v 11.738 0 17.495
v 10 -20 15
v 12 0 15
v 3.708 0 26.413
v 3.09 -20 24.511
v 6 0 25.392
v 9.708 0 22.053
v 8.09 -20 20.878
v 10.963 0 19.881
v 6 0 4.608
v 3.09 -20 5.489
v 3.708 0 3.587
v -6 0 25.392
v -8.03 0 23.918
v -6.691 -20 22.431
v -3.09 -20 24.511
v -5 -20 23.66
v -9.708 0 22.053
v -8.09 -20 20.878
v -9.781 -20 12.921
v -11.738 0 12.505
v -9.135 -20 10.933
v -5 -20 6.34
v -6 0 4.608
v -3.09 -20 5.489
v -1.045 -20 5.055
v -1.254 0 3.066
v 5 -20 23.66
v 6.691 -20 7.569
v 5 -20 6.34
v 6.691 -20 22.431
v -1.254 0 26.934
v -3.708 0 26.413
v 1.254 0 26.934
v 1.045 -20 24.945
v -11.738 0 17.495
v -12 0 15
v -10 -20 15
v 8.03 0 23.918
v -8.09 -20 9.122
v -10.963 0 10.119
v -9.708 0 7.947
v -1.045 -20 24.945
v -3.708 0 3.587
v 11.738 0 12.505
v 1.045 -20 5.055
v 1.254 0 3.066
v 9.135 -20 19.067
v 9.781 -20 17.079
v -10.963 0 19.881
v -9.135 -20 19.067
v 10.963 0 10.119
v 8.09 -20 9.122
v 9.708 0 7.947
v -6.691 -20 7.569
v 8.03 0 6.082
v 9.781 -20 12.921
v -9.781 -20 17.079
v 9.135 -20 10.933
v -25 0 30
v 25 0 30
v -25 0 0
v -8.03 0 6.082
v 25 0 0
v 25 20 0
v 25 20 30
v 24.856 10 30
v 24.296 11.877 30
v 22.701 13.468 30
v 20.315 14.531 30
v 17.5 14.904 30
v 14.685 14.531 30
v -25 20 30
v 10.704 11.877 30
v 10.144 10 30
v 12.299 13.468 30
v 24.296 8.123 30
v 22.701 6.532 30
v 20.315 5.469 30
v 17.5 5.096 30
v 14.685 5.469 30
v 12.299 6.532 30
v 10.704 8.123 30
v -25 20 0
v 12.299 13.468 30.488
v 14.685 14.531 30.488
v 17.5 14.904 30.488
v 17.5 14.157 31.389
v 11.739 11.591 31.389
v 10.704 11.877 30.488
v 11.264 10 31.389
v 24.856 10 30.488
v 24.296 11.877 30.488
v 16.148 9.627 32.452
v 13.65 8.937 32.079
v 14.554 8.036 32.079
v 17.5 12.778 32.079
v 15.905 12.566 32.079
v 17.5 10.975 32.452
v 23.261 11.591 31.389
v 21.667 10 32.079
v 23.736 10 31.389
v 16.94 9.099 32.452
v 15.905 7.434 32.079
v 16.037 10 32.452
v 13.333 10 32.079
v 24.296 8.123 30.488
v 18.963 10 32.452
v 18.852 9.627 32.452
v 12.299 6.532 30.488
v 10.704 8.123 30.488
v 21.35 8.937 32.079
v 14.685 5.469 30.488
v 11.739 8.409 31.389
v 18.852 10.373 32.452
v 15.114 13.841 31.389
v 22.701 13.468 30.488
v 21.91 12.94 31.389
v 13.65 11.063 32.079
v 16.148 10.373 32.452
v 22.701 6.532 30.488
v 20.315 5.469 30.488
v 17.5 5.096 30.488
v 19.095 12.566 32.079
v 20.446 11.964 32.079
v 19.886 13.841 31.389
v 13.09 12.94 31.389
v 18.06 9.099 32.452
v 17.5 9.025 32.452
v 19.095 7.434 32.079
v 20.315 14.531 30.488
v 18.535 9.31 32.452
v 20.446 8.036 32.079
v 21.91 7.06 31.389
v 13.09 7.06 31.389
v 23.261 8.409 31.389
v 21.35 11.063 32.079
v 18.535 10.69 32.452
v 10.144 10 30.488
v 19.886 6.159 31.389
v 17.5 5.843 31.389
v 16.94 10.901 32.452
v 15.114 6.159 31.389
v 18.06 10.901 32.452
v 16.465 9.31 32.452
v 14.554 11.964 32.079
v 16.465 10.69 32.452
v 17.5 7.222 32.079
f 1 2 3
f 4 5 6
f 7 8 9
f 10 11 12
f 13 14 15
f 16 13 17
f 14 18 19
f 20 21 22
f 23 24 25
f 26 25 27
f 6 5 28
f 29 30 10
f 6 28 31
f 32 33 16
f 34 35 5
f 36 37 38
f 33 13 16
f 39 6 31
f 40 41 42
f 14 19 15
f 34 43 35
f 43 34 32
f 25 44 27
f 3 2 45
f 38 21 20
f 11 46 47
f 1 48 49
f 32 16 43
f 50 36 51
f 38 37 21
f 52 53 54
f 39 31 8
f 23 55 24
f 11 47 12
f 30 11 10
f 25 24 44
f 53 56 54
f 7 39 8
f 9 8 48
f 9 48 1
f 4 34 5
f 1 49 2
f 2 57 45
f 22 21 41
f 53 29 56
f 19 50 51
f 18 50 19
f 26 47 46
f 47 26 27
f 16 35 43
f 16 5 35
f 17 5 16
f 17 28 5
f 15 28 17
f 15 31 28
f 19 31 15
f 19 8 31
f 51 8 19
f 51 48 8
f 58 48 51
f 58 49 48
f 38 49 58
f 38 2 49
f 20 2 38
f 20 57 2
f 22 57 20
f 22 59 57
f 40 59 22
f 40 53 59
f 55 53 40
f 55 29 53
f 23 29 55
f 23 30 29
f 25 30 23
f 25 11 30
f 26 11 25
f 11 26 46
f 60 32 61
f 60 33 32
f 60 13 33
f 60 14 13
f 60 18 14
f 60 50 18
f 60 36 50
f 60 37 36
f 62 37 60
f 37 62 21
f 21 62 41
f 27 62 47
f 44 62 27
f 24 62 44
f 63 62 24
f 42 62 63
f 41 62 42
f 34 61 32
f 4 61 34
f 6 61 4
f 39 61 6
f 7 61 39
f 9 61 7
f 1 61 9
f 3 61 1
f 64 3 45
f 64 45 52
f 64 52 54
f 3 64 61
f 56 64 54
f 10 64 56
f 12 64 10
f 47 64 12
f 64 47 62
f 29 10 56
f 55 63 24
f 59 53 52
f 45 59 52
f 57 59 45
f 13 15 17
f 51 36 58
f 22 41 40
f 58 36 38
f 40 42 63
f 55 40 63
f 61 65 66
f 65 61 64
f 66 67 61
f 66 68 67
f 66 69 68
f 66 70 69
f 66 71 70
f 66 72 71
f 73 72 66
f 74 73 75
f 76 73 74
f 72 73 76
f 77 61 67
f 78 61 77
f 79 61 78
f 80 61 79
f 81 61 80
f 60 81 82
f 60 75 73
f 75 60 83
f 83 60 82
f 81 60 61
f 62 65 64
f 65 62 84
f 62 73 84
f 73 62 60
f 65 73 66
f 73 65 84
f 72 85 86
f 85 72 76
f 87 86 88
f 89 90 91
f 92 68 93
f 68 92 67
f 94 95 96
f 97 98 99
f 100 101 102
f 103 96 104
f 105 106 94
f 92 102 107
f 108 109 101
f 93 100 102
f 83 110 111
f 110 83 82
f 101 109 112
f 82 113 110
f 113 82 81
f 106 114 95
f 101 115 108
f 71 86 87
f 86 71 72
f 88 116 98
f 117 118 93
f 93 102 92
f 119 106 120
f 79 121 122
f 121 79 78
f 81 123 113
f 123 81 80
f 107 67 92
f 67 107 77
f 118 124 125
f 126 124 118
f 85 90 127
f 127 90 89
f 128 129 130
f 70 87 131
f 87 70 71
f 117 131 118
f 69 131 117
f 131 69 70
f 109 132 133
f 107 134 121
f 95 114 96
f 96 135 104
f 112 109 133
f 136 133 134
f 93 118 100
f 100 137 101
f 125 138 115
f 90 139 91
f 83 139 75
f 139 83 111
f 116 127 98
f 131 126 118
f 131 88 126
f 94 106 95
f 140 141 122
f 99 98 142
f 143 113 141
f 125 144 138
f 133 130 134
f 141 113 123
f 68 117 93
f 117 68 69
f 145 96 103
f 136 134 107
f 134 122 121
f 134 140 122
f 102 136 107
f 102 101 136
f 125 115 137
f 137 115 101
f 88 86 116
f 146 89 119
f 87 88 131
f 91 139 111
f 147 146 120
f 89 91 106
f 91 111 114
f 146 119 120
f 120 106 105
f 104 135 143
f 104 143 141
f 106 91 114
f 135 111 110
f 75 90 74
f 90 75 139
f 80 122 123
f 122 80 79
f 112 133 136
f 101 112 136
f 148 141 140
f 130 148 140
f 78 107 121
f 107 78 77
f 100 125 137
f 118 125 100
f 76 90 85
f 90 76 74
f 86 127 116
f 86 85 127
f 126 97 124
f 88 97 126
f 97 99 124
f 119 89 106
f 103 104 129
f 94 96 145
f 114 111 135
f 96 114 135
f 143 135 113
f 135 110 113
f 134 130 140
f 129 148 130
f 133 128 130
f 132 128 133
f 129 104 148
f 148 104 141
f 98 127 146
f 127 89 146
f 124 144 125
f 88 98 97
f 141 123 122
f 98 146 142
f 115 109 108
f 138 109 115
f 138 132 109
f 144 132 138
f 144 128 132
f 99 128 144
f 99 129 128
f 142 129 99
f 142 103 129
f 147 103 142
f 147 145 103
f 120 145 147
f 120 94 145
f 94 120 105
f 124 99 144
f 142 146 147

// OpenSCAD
//////////////////////////////////////////////////////////////////////////////////////////////////////////////////////////////////////////////////////Open SCAD////////////////////////////////////////////////////////
/*///////////////////////////////////////////////////////////////////////////////////////////////////////////

date started:		
date finishe:		
modeler:		
copyright:		

*/


//////////////////////////////////////////////////////////////////////////////////////////////////////////////////////////////////////////////////////////parameters//////////////////////////////////////////////////////////////////////////////////////////////////////////////////////////////////////////////////////////////////




////////////////////////////////////////////////////////////////////////////////////////////////////////////////////////////////////////////////////////////renders/////////////////////////////////////////////////////////////////////////////////////////////////////////////////////////////////////////////////////////////////////

color("blue")
	translate([0,0,15])
		rotate([90,0,0])
			cylinder(20,12,10);

color("silver")
	translate([-25,0,0])
		cube([50,20,30]);

	translate([17.5,10,30])
		scale([1.5,1,.5])
			sphere(5);

/////////////////////////////////////////////////////////////////////////////////////////////////////////////////////////////////////////////////////////////modules//////////////////////////////////////////////////////////////////////////////////////////////////////////////////////////////////////////////////////////////////
